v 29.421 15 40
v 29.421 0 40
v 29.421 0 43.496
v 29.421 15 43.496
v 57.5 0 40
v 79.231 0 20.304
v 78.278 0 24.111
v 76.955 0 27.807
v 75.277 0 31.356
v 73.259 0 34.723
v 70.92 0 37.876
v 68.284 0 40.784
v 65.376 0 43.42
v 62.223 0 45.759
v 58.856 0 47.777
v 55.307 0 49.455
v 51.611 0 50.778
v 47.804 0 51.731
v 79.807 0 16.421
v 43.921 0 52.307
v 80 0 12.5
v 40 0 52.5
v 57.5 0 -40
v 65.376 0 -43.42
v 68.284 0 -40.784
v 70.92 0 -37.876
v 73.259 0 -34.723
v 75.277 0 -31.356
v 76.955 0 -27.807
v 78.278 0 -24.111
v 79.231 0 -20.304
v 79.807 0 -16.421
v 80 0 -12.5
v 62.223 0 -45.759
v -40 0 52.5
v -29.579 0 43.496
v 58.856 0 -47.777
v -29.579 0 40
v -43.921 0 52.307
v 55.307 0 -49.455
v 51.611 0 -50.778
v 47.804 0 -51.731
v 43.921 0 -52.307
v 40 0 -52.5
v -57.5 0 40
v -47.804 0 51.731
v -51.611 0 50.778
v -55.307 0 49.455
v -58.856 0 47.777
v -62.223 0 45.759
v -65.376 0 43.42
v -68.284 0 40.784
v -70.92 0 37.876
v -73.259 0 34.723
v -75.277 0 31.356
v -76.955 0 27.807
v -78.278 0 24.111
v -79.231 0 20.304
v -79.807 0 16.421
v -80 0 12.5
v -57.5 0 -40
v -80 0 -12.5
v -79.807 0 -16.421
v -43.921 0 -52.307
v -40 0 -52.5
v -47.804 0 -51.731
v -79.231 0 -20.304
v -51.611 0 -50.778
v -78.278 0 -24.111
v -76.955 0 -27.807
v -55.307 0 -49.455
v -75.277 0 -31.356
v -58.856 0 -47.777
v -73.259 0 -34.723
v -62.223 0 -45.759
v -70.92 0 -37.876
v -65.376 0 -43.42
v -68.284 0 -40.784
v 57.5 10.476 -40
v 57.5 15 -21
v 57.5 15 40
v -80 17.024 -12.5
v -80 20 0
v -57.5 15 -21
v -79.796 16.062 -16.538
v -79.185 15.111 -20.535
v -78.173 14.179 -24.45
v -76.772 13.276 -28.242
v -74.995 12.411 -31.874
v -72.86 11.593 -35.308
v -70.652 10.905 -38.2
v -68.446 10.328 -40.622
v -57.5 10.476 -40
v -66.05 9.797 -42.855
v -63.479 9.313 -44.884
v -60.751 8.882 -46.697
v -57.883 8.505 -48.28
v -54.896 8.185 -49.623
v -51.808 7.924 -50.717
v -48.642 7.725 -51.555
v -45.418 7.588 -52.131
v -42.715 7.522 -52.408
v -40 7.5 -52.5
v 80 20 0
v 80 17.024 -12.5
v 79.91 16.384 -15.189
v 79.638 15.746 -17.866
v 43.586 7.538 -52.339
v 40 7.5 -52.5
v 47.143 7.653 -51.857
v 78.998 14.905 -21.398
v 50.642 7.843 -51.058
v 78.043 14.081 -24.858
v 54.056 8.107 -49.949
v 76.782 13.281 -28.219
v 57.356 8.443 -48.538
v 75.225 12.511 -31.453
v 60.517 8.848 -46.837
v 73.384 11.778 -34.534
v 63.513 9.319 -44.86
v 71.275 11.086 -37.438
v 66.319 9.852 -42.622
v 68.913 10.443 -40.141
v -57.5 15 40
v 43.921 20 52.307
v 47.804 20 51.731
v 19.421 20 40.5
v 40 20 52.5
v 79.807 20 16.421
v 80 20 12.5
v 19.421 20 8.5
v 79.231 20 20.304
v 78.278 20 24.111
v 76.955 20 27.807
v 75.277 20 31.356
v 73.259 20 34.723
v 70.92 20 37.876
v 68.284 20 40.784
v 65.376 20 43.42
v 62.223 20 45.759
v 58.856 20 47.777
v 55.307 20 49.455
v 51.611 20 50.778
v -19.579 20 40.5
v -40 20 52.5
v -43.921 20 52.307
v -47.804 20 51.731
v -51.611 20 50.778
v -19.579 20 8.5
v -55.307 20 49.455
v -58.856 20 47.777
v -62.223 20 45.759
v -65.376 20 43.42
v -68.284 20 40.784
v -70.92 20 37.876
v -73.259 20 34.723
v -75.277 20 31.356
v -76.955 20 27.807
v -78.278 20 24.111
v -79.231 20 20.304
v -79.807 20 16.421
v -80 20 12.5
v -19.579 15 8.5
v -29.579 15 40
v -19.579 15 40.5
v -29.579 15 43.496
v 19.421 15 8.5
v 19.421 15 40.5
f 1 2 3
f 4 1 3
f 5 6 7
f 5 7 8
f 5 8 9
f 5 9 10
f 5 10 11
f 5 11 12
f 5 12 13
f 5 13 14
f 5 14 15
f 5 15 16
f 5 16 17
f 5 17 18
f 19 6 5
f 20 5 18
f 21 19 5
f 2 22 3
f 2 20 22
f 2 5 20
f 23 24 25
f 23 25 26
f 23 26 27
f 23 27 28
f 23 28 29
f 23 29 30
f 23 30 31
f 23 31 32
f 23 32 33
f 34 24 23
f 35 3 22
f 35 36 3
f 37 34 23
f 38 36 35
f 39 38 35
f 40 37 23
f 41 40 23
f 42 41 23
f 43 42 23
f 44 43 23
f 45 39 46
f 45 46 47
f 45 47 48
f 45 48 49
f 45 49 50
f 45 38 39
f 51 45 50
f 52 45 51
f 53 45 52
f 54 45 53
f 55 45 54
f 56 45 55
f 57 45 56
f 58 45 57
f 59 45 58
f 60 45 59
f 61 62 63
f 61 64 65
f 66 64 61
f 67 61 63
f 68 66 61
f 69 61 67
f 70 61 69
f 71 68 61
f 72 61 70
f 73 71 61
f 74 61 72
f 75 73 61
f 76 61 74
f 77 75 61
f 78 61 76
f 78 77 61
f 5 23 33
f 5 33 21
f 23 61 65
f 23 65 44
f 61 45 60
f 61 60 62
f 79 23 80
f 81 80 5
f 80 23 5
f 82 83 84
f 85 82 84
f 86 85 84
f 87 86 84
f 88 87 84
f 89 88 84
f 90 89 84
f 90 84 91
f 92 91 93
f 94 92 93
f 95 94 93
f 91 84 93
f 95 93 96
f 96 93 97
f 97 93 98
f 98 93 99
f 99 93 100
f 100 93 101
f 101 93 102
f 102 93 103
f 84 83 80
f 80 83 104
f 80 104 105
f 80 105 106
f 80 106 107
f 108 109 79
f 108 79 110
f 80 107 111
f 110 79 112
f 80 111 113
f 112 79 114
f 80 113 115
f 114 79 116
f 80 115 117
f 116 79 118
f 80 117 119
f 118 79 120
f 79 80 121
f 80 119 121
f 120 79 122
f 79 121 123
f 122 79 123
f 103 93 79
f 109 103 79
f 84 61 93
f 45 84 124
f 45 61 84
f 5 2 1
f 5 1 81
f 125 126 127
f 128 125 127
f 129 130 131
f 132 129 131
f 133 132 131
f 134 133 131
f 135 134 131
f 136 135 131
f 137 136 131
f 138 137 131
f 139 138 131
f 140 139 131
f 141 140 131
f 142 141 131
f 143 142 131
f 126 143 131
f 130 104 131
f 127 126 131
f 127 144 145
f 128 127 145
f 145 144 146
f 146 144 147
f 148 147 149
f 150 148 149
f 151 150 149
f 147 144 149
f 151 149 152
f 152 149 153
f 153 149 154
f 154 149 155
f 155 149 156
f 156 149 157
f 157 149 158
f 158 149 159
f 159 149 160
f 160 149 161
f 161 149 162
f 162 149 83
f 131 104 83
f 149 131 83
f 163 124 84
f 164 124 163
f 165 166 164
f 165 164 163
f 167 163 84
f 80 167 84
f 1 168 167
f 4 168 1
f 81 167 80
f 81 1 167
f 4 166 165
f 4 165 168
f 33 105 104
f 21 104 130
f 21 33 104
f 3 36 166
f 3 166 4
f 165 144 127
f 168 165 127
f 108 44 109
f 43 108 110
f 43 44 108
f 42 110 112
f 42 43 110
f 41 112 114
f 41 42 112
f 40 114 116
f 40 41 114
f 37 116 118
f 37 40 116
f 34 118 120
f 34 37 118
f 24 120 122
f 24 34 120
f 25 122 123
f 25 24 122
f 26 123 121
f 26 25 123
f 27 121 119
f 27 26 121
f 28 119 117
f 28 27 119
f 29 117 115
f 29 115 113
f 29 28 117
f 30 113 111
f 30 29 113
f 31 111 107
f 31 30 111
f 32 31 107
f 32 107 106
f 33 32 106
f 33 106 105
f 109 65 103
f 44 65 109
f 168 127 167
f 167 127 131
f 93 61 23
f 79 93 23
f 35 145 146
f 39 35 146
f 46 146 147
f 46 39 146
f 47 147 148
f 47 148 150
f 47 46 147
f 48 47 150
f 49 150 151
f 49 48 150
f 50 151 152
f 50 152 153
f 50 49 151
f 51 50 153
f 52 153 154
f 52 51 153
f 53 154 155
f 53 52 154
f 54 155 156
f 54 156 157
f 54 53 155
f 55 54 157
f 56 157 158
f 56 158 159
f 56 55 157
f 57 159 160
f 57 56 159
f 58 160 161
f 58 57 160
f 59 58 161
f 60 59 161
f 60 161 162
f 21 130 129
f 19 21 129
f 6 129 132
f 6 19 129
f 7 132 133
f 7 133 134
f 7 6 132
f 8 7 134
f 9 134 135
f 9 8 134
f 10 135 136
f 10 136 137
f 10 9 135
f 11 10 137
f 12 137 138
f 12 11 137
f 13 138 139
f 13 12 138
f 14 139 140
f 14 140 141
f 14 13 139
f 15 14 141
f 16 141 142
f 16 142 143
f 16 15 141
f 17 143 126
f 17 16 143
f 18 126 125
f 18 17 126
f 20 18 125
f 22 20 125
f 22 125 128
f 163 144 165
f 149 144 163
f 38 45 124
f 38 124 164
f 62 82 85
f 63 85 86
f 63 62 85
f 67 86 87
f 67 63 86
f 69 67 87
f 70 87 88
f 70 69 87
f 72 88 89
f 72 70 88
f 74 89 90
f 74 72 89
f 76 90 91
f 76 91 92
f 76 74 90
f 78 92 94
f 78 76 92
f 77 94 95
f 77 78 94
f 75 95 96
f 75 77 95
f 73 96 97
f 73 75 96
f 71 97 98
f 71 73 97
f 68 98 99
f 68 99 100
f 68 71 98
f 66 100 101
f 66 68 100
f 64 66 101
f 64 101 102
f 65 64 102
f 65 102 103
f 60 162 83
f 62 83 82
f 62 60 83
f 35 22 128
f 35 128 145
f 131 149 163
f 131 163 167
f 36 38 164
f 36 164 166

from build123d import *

# Parameters (mm, degrees)
BOSS_EXTRUDE1_DEPTH = 20
SKETCH5_W           = 39
SKETCH5_H           = 32
CUT_EXTRUDE1_DEPTH  = 98.75607398
SKETCH6_W           = 59
SKETCH6_H           = 54.995658629
CUT_EXTRUDE2_DEPTH  = 15
SKETCH7_W           = 115
SKETCH7_H           = 80
CUT_EXTRUDE3_DEPTH  = 15
SKETCH8_OUTSIDE_W   = 145.484
SKETCH8_OUTSIDE_H   = 60.484
CUT_EXTRUDE4_DEPTH  = 170.576678821


with BuildPart() as part:
    # Sketch1 → Boss-Extrude1 (new body)
    with BuildSketch(Plane(origin=(0, 0, 0), x_dir=(1, 0, 0), z_dir=(0, 1, 0))):
        with BuildLine():
            Line((40, -52.5), (-40, -52.5))
            ThreePointArc((-40, -52.5), (-68.284271247, -40.784271247), (-80, -12.5))
            Line((-80, -12.5), (-80, 12.5))
            ThreePointArc((-80, 12.5), (-68.284271247, 40.784271247), (-40, 52.5))
            Line((-40, 52.5), (40, 52.5))
            ThreePointArc((40, 52.5), (68.284271247, 40.784271247), (80, 12.5))
            Line((80, 12.5), (80, -12.5))
            ThreePointArc((80, -12.5), (68.284271247, -40.784271247), (40, -52.5))
        make_face()
    extrude(amount=BOSS_EXTRUDE1_DEPTH)

    # Sketch5 → Cut-Extrude1 (cut, through all)
    with BuildSketch(Plane(origin=(0, 20, 0), x_dir=(1, 0, 0), z_dir=(0, 1, 0))):
        with Locations((-0.079334532, -24.5)):
            Rectangle(SKETCH5_W, SKETCH5_H)
    extrude(amount=-CUT_EXTRUDE1_DEPTH, mode=Mode.SUBTRACT)

    # Sketch6 → Cut-Extrude2 (cut)
    with BuildSketch(Plane.XZ):
        with Locations((-0.079334532, 15.997829315)):
            Rectangle(SKETCH6_W, SKETCH6_H)
    extrude(amount=-CUT_EXTRUDE2_DEPTH, mode=Mode.SUBTRACT)

    # Sketch7 → Cut-Extrude3 (cut)
    with BuildSketch(Plane.XZ):
        Rectangle(SKETCH7_W, SKETCH7_H)
    extrude(amount=-CUT_EXTRUDE3_DEPTH, mode=Mode.SUBTRACT)

    # Sketch8 outside → Cut-Extrude4 (cut, through all)
    with BuildSketch(Plane(origin=(80, 0, 0), x_dir=(0, 0, -1), z_dir=(1, 0, 0))):
        with Locations((0, 10)):
            Rectangle(SKETCH8_OUTSIDE_W, SKETCH8_OUTSIDE_H)
        Polygon((0, 20), (52.5, 7.5), (52.5, 0), (-27.5, 0), (-52.5, 0), (-52.5, 20), (-27.5, 20), align=None, mode=Mode.SUBTRACT)
    extrude(amount=-CUT_EXTRUDE4_DEPTH, mode=Mode.SUBTRACT)


solid = part.part
